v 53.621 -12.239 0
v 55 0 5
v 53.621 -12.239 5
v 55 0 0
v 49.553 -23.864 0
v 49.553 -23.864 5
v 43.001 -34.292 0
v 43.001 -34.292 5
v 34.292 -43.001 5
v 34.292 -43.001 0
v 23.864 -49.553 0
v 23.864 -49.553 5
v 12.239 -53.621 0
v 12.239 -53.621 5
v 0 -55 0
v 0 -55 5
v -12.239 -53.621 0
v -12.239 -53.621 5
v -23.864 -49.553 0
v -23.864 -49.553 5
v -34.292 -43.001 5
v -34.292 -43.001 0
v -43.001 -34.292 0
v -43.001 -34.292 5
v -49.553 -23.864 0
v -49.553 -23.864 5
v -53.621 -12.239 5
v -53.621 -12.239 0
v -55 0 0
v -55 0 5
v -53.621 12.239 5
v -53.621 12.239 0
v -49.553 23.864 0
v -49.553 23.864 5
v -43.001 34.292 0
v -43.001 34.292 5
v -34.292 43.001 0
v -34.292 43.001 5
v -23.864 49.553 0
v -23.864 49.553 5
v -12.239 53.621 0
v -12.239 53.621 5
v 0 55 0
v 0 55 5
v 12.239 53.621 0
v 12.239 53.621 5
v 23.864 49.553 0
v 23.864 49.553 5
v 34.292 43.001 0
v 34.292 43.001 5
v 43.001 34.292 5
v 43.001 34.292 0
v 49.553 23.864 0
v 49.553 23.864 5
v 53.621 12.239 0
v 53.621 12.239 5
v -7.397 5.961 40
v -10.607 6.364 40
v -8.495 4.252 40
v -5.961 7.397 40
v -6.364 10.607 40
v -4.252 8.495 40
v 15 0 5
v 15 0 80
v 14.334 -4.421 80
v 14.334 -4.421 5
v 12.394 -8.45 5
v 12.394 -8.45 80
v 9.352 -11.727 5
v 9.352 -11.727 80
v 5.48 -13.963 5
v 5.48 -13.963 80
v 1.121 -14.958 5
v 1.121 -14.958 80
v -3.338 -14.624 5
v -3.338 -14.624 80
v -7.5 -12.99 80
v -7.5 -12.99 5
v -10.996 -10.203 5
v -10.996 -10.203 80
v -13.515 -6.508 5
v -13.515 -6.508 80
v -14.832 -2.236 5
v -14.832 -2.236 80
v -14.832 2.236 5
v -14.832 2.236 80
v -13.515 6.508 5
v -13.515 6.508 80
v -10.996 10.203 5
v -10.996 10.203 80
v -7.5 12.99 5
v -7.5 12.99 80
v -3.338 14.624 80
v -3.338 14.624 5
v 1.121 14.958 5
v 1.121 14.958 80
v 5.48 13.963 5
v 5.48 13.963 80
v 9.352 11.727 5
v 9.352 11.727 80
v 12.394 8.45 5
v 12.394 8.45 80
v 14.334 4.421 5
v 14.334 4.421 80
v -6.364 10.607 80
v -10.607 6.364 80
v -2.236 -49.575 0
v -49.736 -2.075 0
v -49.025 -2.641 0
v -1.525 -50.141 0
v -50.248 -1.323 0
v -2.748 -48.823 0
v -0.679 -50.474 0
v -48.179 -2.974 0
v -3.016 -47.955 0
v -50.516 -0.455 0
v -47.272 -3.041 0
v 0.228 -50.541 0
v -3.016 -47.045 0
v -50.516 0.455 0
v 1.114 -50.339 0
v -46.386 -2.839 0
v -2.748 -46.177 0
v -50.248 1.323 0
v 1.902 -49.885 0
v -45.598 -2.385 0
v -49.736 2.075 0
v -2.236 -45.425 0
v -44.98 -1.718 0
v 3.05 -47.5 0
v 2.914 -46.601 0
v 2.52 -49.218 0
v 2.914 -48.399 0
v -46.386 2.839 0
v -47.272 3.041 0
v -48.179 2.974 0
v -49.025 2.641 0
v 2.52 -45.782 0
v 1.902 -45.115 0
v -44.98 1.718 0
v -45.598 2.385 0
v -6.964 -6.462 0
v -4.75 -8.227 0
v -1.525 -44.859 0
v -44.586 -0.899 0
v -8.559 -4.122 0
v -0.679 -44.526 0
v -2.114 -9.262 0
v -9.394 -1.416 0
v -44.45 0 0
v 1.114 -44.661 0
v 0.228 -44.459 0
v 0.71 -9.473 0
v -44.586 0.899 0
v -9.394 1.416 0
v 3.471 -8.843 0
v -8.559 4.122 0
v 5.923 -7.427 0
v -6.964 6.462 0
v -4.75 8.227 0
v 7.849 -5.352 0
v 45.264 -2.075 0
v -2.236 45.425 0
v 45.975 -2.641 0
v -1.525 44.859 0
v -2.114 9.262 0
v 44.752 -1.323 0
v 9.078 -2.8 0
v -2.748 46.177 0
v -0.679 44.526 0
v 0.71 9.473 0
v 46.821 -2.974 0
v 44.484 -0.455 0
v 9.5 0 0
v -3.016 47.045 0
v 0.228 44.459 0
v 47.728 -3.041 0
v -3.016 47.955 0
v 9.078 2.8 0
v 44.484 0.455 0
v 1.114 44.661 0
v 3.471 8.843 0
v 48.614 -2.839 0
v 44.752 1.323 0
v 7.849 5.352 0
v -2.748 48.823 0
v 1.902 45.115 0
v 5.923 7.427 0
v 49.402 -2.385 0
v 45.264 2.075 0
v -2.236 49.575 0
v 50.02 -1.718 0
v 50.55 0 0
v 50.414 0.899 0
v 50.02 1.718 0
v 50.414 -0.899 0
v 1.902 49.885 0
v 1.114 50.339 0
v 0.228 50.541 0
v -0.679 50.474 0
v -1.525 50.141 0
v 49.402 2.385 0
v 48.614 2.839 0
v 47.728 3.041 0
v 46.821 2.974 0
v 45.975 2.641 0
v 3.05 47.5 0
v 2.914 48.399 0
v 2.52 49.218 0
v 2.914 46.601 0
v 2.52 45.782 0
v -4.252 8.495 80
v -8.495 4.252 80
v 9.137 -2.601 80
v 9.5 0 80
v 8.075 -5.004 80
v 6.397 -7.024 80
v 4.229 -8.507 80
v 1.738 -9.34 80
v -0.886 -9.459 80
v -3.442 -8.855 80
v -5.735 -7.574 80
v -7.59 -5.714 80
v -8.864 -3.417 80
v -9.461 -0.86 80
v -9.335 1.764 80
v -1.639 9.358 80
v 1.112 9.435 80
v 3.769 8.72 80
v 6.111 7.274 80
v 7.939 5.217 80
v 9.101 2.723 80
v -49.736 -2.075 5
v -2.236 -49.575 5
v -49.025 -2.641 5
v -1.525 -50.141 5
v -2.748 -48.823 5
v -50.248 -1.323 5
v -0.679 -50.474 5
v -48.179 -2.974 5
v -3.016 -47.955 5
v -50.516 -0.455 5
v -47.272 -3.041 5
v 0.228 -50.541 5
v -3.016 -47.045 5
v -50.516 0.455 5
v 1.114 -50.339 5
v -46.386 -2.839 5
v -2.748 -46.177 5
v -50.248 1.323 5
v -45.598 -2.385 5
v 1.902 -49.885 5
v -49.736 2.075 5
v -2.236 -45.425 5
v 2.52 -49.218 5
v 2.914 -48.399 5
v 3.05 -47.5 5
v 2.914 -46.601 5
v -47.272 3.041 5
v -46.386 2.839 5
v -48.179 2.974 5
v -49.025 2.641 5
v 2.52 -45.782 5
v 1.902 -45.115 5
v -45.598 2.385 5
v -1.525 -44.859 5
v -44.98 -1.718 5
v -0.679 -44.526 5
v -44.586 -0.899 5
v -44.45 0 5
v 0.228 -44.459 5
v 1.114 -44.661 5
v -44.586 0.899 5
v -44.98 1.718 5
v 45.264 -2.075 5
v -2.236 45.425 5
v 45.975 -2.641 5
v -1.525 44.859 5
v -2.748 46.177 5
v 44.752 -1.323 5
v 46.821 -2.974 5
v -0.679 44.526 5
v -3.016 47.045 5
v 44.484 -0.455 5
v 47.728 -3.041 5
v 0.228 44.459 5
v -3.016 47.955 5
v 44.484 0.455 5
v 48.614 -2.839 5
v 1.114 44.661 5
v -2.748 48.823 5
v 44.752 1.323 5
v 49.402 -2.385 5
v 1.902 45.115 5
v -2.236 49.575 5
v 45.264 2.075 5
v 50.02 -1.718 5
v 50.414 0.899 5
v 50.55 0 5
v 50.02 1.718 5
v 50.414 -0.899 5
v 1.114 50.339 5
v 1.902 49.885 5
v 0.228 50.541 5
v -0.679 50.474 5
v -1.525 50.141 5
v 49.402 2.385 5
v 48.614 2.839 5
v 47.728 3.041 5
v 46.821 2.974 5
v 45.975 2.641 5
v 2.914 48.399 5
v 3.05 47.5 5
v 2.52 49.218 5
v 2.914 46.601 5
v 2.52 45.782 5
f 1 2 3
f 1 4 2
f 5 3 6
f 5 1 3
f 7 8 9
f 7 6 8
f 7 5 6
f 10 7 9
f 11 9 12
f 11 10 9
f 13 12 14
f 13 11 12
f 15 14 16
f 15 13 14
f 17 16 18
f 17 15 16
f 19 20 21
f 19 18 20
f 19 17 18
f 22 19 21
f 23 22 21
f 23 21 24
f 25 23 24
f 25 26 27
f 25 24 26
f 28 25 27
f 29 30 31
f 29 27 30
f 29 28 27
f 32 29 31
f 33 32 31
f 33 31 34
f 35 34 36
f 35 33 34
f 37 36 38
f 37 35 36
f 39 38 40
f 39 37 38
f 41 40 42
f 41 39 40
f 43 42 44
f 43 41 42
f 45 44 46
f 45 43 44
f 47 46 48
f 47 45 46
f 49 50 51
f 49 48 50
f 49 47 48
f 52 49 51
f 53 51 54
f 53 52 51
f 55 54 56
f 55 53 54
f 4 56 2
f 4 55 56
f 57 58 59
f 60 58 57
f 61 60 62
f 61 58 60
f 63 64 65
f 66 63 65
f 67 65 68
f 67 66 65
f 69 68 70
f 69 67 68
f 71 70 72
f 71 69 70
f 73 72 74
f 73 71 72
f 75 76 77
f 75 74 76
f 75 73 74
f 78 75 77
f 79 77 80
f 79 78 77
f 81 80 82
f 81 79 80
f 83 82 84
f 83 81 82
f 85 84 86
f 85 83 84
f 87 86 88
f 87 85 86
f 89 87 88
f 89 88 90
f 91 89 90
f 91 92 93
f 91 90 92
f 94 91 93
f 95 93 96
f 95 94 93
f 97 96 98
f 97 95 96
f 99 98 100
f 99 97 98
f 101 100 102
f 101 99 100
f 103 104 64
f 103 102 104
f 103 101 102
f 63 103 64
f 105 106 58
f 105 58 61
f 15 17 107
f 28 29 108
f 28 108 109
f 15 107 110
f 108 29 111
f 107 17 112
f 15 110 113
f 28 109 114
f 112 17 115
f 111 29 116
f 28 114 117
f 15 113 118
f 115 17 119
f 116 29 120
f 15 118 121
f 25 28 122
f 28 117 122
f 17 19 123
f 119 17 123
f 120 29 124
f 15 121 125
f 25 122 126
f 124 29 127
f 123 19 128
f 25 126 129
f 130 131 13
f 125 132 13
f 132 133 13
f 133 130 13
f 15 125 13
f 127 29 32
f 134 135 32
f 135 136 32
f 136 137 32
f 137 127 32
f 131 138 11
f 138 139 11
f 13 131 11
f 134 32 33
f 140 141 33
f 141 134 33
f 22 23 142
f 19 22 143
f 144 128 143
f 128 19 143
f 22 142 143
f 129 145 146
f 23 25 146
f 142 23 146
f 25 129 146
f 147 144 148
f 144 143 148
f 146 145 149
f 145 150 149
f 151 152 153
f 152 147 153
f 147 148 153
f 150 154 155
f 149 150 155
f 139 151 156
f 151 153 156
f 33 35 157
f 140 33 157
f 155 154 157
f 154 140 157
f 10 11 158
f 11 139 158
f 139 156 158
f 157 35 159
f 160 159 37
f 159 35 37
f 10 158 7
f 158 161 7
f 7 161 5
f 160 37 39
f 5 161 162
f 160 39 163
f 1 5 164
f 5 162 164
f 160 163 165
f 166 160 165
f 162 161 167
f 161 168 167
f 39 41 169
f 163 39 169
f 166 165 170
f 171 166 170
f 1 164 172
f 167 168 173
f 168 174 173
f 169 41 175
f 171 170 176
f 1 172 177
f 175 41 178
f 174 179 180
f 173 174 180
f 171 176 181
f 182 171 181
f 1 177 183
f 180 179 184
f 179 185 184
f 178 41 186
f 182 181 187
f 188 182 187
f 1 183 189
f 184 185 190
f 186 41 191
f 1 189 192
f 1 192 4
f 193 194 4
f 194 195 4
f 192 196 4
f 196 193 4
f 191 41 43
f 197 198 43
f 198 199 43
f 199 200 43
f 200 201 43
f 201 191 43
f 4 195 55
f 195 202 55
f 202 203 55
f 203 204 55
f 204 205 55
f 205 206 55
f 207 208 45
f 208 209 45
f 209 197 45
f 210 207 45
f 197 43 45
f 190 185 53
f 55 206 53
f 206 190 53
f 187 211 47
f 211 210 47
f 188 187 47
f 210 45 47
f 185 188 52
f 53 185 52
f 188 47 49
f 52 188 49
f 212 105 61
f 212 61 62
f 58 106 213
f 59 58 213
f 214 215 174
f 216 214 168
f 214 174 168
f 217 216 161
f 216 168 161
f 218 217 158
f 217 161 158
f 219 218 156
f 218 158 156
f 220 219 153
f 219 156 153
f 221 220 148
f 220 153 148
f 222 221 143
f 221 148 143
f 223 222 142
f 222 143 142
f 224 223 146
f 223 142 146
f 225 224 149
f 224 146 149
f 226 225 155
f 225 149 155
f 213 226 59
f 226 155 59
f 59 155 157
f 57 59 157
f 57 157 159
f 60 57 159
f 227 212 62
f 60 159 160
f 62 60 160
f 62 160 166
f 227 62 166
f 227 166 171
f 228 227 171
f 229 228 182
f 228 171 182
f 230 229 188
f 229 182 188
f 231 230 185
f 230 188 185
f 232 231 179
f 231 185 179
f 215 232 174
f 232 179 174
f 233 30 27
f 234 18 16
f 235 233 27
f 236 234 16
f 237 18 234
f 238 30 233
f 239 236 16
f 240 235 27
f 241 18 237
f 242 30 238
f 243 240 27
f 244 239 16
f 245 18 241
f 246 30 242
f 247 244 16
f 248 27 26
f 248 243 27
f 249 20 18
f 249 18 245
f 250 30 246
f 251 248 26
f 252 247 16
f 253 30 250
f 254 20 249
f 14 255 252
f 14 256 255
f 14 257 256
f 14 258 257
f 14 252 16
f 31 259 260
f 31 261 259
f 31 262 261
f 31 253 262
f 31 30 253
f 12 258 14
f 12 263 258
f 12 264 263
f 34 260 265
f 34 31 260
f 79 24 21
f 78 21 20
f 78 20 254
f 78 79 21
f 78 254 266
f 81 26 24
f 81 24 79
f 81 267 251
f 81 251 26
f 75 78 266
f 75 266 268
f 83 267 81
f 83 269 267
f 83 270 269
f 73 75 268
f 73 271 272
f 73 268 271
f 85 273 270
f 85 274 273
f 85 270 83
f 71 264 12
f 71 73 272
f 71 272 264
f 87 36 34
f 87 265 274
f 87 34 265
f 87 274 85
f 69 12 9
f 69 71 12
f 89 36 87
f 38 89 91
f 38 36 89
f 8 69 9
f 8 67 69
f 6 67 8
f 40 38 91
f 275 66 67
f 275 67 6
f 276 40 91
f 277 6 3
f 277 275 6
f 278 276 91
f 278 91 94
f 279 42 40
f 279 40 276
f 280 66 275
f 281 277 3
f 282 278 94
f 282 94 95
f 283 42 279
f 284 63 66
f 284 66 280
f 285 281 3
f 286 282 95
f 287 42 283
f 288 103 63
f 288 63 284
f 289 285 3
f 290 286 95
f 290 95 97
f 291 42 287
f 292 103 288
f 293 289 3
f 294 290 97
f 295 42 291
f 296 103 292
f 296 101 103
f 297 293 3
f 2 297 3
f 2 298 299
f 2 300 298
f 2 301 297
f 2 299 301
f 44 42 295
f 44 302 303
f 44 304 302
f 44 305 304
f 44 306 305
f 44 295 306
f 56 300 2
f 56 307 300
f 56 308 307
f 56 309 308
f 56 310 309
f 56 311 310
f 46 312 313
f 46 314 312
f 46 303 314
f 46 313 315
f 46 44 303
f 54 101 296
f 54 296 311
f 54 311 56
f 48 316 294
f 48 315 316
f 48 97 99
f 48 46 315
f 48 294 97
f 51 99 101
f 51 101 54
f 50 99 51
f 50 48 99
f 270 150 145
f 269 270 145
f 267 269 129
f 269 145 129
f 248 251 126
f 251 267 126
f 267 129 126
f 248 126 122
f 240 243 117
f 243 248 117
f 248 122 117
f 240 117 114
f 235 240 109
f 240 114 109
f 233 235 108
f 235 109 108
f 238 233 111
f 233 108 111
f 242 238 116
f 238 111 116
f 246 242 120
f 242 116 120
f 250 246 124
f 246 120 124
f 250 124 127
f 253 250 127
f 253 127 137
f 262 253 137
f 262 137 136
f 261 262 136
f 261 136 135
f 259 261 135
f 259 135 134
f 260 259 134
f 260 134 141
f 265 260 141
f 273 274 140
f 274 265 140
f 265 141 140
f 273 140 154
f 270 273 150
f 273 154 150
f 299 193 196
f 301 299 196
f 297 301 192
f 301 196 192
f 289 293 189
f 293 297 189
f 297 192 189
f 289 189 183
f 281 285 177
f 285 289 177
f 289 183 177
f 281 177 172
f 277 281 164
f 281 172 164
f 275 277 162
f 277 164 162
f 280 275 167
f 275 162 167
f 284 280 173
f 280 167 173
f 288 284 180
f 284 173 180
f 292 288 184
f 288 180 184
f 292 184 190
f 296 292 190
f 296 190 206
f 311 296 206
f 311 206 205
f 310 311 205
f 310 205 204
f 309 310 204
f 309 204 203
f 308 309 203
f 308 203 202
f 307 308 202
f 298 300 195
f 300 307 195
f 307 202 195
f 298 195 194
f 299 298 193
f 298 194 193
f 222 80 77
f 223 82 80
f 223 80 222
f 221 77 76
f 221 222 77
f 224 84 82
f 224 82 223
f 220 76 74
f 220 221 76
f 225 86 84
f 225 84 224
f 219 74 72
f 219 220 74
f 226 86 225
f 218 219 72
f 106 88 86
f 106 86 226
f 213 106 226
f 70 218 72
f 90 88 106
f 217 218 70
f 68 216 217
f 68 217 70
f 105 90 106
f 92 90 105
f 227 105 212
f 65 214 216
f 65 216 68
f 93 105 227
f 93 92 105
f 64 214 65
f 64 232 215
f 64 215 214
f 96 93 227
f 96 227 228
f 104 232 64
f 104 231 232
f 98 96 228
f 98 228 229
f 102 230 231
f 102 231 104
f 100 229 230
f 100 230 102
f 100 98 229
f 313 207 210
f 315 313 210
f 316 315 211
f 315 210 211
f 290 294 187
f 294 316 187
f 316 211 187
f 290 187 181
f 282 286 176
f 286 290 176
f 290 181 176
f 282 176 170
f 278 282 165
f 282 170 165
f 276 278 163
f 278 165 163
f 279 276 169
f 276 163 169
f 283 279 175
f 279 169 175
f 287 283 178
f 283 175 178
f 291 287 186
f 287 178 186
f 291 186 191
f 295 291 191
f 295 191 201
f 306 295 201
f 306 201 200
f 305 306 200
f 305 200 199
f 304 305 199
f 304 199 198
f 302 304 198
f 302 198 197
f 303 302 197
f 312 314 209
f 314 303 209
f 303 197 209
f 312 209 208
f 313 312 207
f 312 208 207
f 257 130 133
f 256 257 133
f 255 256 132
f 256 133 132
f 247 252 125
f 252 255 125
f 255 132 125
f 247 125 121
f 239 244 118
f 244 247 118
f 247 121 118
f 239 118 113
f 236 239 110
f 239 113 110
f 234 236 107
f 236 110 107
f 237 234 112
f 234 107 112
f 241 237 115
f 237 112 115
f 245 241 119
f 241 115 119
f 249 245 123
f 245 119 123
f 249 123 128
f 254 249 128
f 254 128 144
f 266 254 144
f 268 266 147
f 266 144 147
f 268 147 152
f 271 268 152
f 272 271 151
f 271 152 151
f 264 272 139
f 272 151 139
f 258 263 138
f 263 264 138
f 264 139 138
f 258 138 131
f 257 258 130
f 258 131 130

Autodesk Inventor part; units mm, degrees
ref_plane "YZ Plane" through (0, 0, 0) normal (1, 0, 0) x (0, 1, 0)
ref_plane "XZ Plane" through (0, 0, 0) normal (0, 1, 0) x (-1, 0, 0)
ref_plane "XY Plane" through (0, 0, 0) normal (0, 0, 1) x (1, 0, 0)
sketch "Sketch1" plane through (0, 0, 0) normal (0, 0, 1) x (1, 0, 0)
  circle A0 centre (0, 0) radius 47.5 construction
  circle A1 centre (0, 47.5) radius 3.05
  circle A2 centre (-47.5, 0) radius 3.05
  circle A3 centre (0, -47.5) radius 3.05
  circle A4 centre (47.5, 0) radius 3.05
  circle A5 centre (0, 0) radius 15 construction
  circle A6 centre (0, 0) radius 55
  circle A7 centre (0, 0) radius 9.5
  dimension "d0" = 95
  dimension "d1" = 6.1
  dimension "d4" = 360
  dimension "d6" = 30
  dimension "d7" = 110
  dimension "d8" = 19
extrude "Extrusion1" add sketch "Sketch1" along normal blind 5
sketch "Sketch2" plane through (0, 0, 5) normal (0, 0, 1) x (1, 0, 0)
  circle A0 centre (0, 0) radius 15
  circle A1 centre (0, 0) radius 9.5 projected
  dimension "d11" = 30
extrude "Extrusion2" add sketch "Sketch2" along normal blind 75
sketch "Sketch3" plane through (0, 0, 80) normal (0, 0, 1) x (1, 0, 0)
  circle A0 centre (0, 0) radius 15 projected
  circle A1 centre (0, 0) radius 9.5 projected
  line L0 (6.7175, -6.7175) -> (-8.4853, 8.4853)
  line L1 (-8.4853, 8.4853) -> (-10.6066, 6.364)
  line L2 (-10.6066, 6.364) -> (-8.4951, 4.2525)
  line L3 (-8.4853, 8.4853) -> (-6.364, 10.6066)
  line L4 (-6.364, 10.6066) -> (-4.2525, 8.4951)
  dimension "d14" = 21.5
  dimension "d15" = 3
  dimension "d16" = 3
extrude "Extrusion3" cut sketch "Sketch3" against normal blind 40 contours A1 L0 L3 L4 | A1 L2 L1 L0
properties part number "wheelFlangeTopMotor"
